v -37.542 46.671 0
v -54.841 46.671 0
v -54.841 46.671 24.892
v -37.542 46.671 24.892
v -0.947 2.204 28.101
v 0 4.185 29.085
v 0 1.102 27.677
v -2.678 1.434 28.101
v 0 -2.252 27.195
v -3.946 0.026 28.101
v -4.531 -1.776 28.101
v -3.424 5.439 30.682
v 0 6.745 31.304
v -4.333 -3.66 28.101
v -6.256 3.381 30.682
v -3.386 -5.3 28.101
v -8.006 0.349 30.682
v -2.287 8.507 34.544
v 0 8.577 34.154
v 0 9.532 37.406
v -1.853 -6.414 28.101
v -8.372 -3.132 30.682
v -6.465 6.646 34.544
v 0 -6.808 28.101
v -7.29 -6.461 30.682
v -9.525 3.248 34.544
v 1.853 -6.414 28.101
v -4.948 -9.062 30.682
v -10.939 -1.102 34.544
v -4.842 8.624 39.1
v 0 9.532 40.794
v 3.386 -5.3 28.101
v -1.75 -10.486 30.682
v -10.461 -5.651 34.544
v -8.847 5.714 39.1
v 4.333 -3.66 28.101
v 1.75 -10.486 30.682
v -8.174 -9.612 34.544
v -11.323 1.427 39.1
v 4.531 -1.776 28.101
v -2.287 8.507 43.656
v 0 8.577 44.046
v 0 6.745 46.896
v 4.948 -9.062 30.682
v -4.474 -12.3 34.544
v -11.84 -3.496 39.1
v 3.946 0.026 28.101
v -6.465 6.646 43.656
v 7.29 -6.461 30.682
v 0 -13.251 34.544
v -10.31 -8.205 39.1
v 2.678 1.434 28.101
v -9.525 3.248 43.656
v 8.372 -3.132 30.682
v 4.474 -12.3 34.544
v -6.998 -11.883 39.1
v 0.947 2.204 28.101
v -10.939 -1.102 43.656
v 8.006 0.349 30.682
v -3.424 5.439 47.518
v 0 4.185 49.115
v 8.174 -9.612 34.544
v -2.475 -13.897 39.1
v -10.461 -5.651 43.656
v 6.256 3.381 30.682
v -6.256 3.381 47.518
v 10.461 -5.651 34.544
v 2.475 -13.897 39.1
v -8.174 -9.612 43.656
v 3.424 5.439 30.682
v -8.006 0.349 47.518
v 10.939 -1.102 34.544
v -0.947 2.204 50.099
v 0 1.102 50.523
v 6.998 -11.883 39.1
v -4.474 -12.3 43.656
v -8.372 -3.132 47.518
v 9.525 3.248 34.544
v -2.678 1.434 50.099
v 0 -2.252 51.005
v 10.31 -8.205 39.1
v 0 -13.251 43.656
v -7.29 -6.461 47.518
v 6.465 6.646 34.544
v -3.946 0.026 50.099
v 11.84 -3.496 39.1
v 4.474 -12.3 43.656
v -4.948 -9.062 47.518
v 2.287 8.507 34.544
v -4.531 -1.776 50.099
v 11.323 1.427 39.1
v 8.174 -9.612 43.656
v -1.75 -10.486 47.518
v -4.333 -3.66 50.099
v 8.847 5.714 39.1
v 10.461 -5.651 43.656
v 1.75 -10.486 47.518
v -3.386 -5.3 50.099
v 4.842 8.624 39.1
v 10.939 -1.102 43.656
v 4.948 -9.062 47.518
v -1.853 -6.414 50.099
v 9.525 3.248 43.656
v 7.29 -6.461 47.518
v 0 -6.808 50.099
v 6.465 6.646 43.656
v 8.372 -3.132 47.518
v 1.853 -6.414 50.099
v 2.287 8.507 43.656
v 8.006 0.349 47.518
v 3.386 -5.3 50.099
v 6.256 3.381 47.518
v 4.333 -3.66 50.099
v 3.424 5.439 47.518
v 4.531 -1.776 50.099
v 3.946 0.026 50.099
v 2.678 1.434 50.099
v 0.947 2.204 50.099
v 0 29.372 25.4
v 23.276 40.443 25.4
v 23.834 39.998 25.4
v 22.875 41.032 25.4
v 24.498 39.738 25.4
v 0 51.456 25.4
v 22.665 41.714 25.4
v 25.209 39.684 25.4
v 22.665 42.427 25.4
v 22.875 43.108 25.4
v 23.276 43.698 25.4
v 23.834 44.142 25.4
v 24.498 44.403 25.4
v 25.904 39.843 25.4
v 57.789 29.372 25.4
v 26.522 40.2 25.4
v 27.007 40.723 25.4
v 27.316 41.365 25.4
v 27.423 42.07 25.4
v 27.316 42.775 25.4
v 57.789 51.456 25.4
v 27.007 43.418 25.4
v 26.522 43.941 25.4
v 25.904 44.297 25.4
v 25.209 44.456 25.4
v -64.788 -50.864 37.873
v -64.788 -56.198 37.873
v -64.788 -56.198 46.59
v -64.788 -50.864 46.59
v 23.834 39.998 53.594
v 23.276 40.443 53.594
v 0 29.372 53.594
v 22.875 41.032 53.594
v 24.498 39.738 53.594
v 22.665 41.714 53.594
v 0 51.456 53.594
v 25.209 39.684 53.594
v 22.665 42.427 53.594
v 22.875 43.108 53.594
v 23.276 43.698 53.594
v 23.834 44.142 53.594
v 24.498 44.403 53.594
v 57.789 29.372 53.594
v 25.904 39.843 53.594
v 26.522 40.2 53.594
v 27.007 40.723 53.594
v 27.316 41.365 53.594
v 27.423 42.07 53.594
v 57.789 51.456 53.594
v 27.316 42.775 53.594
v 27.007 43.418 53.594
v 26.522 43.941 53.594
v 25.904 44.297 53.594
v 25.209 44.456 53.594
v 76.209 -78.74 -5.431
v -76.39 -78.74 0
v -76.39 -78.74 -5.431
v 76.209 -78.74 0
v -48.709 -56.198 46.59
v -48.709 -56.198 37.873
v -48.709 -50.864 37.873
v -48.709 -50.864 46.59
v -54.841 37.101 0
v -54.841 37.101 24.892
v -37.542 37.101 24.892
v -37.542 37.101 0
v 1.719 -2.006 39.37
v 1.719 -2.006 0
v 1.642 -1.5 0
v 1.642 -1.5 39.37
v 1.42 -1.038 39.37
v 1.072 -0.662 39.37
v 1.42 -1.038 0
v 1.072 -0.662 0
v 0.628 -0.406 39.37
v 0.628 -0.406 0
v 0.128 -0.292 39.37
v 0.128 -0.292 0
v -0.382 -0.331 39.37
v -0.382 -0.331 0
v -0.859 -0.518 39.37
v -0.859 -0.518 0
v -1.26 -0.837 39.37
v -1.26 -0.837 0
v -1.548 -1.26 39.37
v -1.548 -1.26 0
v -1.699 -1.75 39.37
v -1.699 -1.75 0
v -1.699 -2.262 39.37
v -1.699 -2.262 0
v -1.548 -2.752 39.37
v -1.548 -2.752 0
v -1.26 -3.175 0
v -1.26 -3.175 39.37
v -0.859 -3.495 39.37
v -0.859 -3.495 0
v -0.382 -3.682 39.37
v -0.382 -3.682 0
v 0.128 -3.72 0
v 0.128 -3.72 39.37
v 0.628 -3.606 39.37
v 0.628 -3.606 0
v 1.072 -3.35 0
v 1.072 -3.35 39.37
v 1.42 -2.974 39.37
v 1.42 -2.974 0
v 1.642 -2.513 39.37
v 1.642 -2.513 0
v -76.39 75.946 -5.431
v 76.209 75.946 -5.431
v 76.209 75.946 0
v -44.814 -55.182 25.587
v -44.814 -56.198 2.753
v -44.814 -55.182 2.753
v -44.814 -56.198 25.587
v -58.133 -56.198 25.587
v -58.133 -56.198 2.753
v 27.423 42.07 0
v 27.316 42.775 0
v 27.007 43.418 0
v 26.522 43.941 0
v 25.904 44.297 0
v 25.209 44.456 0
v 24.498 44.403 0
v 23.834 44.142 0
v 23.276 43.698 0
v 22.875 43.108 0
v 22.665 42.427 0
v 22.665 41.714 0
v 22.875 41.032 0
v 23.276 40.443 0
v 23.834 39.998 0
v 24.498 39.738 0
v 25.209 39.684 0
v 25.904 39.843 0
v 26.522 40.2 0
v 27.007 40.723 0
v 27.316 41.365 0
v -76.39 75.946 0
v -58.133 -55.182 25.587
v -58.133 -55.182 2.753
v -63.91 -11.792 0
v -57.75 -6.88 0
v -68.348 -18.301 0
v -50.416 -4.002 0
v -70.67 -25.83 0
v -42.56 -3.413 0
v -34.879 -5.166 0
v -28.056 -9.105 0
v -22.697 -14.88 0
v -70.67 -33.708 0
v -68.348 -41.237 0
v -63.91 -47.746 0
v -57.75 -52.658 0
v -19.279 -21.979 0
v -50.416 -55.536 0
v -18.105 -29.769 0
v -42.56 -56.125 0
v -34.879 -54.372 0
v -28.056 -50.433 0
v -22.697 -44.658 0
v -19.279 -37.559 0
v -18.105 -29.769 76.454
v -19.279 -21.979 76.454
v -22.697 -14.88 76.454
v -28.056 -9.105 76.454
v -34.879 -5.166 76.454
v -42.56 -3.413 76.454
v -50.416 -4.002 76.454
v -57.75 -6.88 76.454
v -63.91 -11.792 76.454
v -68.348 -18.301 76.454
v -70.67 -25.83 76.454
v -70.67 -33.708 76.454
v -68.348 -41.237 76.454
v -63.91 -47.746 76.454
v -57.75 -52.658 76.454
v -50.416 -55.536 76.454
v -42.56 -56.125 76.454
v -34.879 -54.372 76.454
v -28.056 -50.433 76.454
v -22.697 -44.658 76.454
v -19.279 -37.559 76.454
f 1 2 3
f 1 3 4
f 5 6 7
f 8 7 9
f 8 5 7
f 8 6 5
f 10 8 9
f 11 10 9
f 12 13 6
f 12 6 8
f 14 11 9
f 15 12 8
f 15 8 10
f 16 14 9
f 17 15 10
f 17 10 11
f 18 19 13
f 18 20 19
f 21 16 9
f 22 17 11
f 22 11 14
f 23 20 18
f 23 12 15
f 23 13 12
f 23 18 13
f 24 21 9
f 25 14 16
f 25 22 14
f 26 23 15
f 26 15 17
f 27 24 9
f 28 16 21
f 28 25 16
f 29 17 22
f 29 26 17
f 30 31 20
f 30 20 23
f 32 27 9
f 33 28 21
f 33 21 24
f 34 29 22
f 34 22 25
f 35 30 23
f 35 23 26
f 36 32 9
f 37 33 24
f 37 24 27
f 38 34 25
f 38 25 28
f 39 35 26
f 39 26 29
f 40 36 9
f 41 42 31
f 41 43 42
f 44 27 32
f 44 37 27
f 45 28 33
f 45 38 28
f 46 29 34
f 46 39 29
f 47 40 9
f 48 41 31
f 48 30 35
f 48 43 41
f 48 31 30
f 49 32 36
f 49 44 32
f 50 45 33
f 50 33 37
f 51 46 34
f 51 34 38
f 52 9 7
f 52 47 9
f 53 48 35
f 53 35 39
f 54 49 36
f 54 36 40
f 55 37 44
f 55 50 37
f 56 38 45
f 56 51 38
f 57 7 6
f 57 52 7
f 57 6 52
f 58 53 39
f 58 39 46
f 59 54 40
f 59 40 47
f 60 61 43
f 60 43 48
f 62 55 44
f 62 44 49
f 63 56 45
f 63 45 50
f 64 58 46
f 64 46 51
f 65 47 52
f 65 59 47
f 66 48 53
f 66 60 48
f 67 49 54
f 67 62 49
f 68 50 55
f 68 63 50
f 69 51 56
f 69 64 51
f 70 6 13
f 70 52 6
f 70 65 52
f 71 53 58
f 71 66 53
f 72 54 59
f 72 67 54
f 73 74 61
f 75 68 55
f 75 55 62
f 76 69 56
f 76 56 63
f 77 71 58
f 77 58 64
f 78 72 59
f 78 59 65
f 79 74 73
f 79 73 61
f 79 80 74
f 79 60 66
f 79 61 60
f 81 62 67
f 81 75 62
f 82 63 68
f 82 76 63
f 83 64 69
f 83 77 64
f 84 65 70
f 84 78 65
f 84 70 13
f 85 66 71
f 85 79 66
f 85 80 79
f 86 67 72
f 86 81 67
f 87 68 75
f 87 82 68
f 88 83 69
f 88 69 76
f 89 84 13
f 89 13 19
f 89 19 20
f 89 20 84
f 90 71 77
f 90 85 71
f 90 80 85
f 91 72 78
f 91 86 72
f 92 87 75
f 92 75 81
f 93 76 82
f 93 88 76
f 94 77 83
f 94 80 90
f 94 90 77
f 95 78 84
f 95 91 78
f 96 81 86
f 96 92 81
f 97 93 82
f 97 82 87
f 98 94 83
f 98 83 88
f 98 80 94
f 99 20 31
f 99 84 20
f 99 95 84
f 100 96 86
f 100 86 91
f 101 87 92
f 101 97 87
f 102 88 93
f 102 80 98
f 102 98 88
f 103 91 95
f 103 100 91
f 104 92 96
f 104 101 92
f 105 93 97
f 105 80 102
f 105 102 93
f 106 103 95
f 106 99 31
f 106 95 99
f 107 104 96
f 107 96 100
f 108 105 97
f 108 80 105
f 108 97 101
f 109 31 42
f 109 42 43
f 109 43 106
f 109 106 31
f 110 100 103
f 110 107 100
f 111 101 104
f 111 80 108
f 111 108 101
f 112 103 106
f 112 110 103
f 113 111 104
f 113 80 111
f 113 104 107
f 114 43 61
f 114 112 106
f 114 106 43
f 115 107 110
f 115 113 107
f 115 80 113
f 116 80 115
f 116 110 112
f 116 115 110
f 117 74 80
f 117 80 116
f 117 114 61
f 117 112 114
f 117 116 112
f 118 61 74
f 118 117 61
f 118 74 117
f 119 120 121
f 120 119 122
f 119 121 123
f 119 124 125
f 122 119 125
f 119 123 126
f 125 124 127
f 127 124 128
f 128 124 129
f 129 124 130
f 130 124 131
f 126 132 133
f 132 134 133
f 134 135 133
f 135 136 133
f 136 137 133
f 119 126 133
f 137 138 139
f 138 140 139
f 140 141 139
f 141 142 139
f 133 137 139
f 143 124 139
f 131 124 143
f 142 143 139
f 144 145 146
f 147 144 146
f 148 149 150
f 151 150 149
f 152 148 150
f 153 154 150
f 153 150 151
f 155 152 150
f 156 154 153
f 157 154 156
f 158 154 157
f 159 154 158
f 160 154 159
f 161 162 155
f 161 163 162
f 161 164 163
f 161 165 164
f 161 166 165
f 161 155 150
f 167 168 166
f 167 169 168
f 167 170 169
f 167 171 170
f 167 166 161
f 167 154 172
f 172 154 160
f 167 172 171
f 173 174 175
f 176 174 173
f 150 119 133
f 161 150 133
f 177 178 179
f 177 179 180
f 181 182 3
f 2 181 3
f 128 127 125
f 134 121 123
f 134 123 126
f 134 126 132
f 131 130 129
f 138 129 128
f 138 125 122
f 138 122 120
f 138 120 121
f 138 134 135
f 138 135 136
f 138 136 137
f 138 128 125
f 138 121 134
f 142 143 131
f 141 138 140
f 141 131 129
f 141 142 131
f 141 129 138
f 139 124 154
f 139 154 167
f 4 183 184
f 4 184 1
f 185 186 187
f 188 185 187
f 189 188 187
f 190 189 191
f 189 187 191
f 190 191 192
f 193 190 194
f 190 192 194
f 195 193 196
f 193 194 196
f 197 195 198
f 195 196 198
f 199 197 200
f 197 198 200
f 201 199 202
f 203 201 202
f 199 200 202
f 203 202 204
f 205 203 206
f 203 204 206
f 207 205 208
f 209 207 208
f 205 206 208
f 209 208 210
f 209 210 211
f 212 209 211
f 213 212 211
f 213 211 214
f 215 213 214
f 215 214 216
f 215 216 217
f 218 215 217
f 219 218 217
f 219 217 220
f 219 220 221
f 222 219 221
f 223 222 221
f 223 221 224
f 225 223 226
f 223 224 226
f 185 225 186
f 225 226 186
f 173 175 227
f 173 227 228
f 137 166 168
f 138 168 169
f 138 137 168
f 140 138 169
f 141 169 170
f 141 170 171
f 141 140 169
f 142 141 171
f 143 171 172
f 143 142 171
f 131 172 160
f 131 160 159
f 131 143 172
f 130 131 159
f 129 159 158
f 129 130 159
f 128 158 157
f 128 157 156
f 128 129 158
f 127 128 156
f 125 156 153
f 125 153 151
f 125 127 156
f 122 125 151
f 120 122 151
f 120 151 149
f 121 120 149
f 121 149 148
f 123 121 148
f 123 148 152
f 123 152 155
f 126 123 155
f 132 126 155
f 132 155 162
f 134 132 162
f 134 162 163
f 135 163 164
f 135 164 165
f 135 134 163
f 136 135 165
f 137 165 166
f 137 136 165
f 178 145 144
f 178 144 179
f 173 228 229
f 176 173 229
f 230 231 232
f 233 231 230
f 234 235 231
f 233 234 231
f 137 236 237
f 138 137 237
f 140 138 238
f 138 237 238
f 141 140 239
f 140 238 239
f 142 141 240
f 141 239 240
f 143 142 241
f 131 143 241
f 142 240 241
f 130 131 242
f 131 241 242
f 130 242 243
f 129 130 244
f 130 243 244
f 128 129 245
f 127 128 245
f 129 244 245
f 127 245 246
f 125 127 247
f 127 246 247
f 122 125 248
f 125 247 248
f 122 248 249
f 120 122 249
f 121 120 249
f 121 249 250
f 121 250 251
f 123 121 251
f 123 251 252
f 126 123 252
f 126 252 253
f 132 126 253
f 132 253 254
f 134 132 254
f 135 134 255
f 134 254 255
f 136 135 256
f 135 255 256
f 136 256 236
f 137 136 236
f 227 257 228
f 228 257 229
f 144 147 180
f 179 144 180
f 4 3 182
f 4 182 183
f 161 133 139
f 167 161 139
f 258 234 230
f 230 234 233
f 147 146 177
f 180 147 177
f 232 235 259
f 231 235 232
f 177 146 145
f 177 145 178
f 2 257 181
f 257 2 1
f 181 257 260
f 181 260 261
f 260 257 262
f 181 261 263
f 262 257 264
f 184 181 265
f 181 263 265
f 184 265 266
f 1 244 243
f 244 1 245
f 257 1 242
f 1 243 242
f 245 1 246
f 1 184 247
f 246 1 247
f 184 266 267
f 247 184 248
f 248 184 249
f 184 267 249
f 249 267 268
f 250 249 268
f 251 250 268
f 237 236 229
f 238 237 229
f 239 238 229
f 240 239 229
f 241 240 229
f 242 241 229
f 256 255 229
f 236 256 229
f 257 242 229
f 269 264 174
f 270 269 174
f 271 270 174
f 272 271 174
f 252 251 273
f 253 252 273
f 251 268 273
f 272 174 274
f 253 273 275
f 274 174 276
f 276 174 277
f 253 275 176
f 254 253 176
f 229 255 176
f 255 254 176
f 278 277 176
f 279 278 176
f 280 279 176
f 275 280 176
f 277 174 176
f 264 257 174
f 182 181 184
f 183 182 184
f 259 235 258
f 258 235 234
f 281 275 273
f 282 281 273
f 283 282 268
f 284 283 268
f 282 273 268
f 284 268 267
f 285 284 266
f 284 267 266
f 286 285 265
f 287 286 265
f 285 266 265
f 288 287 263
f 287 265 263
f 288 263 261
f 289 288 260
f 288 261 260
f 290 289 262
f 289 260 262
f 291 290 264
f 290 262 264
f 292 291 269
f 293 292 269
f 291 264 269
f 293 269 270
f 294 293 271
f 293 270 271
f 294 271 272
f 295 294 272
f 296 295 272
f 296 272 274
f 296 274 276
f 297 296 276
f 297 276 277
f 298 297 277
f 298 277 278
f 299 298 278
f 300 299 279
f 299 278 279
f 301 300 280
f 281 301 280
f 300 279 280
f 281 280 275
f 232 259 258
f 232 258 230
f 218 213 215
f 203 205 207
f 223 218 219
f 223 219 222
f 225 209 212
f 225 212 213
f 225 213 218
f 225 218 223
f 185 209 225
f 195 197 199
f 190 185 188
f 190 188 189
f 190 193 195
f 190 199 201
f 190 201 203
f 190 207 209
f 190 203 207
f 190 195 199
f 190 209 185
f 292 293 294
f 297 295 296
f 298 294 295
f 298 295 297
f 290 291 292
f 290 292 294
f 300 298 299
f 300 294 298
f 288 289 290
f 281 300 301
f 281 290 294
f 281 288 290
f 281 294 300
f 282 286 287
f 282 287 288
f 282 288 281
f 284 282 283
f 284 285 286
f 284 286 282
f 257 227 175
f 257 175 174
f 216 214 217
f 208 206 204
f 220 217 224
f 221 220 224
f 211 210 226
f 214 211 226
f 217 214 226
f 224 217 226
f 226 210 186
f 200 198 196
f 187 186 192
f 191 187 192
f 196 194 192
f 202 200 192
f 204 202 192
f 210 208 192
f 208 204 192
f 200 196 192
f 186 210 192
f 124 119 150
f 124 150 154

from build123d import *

# Parameters (mm, degrees)
F0_W          = 152.5982543826
F0_H          = 5.4305433296
F1_DEPTH      = 78.74
F1_DEPTH_BACK = 75.946
F2_R          = 1.7186274254
F3_DEPTH      = 39.37
F6_R          = 2.3924596608
F7_DEPTH      = 25.4
F8_W          = 57.7885117382
F8_H          = 22.0842137933
F8_R          = 2.3924596608
F9_DEPTH      = 28.194
F10_W         = 17.2992944717
F10_H         = 9.5698237419
F11_DEPTH     = 24.892
F12_R         = 26.4300234809
F13_DEPTH     = 76.454
F16_W         = 13.3196115494
F16_H         = 22.8336232249
F17_DEPTH     = 1.016
F18_W         = 16.0787776113
F18_H         = 8.7167434394
F19_DEPTH     = 5.334


with BuildPart() as f1:
    # F0 (on Front) → F1 (new body, two sides)
    with BuildSketch(Plane.XZ) as f1_sk:
        with Locations((-0.0905133784, -2.7152716648)):
            Rectangle(F0_W, F0_H)
    extrude(amount=F1_DEPTH)
    extrude(f1_sk.sketch, amount=-F1_DEPTH_BACK)

    # F6 (on face) → F7 (join)
    with BuildSketch(Plane.XY):
        with Locations((25.0302739441, 42.0702621341)):
            Circle(F6_R)
    extrude(amount=F7_DEPTH)

    # F10 (on face) → F11 (join)
    with BuildSketch(Plane.XY):
        with Locations((-46.1912974715, 41.8862216175)):
            Rectangle(F10_W, F10_H)
    extrude(amount=F11_DEPTH)

    # F12 (on face) → F13 (join)
    with BuildSketch(Plane.XY):
        with Locations((-44.5349812508, -29.7690033913)):
            Circle(F12_R)
    extrude(amount=F13_DEPTH)


with BuildPart() as f3:
    # F2 (on face) → F3 (new body)
    with BuildSketch(Plane.XY):
        with Locations((0, -2.0061403047)):
            Circle(F2_R)
    extrude(amount=F3_DEPTH)


with BuildPart() as f5:
    # F4 (on Right) → F5 (revolve)
    with BuildSketch(Plane.YZ):
        with BuildLine():
            Line((-2.2519293707, 39.0999093652), (-2.2519293707, 27.1946717426))
            ThreePointArc((-2.2519293707, 27.1946717426), (9.6533082519, 39.0999093652), (-2.2519293707, 51.0051469878))
            Line((-2.2519293707, 51.0051469878), (-2.2519293707, 39.0999093652))
        make_face()
    revolve(axis=Axis((0, -2.2519293707, 45.0525281765), (0, 0, 1)))


with BuildPart() as f9:
    # F8 (on face) → F9 (new body)
    with BuildSketch(Plane.XY.offset(25.4)):
        with Locations((28.8942558691, 40.4139459133)):
            Rectangle(F8_W, F8_H)
        with Locations((25.0302739441, 42.0702621341)):
            Circle(F8_R, mode=Mode.SUBTRACT)
    extrude(amount=F9_DEPTH)


with BuildPart() as f17:
    # F16 (on plane+point) → F17 (new body)
    with BuildSketch(Plane.XZ.offset(56.1978533804)):
        with Locations((-51.4734014869, 14.1701492248)):
            Rectangle(F16_W, F16_H)
    extrude(amount=-F17_DEPTH)


with BuildPart() as f19:
    # F18 (on plane+point) → F19 (new body)
    with BuildSketch(Plane.XZ.offset(56.1978533804)):
        with Locations((-56.7487441003, 42.2314461321)):
            Rectangle(F18_W, F18_H)
    extrude(amount=-F19_DEPTH)


solid = Compound([f1.part, f3.part, f5.part, f9.part, f17.part, f19.part])
